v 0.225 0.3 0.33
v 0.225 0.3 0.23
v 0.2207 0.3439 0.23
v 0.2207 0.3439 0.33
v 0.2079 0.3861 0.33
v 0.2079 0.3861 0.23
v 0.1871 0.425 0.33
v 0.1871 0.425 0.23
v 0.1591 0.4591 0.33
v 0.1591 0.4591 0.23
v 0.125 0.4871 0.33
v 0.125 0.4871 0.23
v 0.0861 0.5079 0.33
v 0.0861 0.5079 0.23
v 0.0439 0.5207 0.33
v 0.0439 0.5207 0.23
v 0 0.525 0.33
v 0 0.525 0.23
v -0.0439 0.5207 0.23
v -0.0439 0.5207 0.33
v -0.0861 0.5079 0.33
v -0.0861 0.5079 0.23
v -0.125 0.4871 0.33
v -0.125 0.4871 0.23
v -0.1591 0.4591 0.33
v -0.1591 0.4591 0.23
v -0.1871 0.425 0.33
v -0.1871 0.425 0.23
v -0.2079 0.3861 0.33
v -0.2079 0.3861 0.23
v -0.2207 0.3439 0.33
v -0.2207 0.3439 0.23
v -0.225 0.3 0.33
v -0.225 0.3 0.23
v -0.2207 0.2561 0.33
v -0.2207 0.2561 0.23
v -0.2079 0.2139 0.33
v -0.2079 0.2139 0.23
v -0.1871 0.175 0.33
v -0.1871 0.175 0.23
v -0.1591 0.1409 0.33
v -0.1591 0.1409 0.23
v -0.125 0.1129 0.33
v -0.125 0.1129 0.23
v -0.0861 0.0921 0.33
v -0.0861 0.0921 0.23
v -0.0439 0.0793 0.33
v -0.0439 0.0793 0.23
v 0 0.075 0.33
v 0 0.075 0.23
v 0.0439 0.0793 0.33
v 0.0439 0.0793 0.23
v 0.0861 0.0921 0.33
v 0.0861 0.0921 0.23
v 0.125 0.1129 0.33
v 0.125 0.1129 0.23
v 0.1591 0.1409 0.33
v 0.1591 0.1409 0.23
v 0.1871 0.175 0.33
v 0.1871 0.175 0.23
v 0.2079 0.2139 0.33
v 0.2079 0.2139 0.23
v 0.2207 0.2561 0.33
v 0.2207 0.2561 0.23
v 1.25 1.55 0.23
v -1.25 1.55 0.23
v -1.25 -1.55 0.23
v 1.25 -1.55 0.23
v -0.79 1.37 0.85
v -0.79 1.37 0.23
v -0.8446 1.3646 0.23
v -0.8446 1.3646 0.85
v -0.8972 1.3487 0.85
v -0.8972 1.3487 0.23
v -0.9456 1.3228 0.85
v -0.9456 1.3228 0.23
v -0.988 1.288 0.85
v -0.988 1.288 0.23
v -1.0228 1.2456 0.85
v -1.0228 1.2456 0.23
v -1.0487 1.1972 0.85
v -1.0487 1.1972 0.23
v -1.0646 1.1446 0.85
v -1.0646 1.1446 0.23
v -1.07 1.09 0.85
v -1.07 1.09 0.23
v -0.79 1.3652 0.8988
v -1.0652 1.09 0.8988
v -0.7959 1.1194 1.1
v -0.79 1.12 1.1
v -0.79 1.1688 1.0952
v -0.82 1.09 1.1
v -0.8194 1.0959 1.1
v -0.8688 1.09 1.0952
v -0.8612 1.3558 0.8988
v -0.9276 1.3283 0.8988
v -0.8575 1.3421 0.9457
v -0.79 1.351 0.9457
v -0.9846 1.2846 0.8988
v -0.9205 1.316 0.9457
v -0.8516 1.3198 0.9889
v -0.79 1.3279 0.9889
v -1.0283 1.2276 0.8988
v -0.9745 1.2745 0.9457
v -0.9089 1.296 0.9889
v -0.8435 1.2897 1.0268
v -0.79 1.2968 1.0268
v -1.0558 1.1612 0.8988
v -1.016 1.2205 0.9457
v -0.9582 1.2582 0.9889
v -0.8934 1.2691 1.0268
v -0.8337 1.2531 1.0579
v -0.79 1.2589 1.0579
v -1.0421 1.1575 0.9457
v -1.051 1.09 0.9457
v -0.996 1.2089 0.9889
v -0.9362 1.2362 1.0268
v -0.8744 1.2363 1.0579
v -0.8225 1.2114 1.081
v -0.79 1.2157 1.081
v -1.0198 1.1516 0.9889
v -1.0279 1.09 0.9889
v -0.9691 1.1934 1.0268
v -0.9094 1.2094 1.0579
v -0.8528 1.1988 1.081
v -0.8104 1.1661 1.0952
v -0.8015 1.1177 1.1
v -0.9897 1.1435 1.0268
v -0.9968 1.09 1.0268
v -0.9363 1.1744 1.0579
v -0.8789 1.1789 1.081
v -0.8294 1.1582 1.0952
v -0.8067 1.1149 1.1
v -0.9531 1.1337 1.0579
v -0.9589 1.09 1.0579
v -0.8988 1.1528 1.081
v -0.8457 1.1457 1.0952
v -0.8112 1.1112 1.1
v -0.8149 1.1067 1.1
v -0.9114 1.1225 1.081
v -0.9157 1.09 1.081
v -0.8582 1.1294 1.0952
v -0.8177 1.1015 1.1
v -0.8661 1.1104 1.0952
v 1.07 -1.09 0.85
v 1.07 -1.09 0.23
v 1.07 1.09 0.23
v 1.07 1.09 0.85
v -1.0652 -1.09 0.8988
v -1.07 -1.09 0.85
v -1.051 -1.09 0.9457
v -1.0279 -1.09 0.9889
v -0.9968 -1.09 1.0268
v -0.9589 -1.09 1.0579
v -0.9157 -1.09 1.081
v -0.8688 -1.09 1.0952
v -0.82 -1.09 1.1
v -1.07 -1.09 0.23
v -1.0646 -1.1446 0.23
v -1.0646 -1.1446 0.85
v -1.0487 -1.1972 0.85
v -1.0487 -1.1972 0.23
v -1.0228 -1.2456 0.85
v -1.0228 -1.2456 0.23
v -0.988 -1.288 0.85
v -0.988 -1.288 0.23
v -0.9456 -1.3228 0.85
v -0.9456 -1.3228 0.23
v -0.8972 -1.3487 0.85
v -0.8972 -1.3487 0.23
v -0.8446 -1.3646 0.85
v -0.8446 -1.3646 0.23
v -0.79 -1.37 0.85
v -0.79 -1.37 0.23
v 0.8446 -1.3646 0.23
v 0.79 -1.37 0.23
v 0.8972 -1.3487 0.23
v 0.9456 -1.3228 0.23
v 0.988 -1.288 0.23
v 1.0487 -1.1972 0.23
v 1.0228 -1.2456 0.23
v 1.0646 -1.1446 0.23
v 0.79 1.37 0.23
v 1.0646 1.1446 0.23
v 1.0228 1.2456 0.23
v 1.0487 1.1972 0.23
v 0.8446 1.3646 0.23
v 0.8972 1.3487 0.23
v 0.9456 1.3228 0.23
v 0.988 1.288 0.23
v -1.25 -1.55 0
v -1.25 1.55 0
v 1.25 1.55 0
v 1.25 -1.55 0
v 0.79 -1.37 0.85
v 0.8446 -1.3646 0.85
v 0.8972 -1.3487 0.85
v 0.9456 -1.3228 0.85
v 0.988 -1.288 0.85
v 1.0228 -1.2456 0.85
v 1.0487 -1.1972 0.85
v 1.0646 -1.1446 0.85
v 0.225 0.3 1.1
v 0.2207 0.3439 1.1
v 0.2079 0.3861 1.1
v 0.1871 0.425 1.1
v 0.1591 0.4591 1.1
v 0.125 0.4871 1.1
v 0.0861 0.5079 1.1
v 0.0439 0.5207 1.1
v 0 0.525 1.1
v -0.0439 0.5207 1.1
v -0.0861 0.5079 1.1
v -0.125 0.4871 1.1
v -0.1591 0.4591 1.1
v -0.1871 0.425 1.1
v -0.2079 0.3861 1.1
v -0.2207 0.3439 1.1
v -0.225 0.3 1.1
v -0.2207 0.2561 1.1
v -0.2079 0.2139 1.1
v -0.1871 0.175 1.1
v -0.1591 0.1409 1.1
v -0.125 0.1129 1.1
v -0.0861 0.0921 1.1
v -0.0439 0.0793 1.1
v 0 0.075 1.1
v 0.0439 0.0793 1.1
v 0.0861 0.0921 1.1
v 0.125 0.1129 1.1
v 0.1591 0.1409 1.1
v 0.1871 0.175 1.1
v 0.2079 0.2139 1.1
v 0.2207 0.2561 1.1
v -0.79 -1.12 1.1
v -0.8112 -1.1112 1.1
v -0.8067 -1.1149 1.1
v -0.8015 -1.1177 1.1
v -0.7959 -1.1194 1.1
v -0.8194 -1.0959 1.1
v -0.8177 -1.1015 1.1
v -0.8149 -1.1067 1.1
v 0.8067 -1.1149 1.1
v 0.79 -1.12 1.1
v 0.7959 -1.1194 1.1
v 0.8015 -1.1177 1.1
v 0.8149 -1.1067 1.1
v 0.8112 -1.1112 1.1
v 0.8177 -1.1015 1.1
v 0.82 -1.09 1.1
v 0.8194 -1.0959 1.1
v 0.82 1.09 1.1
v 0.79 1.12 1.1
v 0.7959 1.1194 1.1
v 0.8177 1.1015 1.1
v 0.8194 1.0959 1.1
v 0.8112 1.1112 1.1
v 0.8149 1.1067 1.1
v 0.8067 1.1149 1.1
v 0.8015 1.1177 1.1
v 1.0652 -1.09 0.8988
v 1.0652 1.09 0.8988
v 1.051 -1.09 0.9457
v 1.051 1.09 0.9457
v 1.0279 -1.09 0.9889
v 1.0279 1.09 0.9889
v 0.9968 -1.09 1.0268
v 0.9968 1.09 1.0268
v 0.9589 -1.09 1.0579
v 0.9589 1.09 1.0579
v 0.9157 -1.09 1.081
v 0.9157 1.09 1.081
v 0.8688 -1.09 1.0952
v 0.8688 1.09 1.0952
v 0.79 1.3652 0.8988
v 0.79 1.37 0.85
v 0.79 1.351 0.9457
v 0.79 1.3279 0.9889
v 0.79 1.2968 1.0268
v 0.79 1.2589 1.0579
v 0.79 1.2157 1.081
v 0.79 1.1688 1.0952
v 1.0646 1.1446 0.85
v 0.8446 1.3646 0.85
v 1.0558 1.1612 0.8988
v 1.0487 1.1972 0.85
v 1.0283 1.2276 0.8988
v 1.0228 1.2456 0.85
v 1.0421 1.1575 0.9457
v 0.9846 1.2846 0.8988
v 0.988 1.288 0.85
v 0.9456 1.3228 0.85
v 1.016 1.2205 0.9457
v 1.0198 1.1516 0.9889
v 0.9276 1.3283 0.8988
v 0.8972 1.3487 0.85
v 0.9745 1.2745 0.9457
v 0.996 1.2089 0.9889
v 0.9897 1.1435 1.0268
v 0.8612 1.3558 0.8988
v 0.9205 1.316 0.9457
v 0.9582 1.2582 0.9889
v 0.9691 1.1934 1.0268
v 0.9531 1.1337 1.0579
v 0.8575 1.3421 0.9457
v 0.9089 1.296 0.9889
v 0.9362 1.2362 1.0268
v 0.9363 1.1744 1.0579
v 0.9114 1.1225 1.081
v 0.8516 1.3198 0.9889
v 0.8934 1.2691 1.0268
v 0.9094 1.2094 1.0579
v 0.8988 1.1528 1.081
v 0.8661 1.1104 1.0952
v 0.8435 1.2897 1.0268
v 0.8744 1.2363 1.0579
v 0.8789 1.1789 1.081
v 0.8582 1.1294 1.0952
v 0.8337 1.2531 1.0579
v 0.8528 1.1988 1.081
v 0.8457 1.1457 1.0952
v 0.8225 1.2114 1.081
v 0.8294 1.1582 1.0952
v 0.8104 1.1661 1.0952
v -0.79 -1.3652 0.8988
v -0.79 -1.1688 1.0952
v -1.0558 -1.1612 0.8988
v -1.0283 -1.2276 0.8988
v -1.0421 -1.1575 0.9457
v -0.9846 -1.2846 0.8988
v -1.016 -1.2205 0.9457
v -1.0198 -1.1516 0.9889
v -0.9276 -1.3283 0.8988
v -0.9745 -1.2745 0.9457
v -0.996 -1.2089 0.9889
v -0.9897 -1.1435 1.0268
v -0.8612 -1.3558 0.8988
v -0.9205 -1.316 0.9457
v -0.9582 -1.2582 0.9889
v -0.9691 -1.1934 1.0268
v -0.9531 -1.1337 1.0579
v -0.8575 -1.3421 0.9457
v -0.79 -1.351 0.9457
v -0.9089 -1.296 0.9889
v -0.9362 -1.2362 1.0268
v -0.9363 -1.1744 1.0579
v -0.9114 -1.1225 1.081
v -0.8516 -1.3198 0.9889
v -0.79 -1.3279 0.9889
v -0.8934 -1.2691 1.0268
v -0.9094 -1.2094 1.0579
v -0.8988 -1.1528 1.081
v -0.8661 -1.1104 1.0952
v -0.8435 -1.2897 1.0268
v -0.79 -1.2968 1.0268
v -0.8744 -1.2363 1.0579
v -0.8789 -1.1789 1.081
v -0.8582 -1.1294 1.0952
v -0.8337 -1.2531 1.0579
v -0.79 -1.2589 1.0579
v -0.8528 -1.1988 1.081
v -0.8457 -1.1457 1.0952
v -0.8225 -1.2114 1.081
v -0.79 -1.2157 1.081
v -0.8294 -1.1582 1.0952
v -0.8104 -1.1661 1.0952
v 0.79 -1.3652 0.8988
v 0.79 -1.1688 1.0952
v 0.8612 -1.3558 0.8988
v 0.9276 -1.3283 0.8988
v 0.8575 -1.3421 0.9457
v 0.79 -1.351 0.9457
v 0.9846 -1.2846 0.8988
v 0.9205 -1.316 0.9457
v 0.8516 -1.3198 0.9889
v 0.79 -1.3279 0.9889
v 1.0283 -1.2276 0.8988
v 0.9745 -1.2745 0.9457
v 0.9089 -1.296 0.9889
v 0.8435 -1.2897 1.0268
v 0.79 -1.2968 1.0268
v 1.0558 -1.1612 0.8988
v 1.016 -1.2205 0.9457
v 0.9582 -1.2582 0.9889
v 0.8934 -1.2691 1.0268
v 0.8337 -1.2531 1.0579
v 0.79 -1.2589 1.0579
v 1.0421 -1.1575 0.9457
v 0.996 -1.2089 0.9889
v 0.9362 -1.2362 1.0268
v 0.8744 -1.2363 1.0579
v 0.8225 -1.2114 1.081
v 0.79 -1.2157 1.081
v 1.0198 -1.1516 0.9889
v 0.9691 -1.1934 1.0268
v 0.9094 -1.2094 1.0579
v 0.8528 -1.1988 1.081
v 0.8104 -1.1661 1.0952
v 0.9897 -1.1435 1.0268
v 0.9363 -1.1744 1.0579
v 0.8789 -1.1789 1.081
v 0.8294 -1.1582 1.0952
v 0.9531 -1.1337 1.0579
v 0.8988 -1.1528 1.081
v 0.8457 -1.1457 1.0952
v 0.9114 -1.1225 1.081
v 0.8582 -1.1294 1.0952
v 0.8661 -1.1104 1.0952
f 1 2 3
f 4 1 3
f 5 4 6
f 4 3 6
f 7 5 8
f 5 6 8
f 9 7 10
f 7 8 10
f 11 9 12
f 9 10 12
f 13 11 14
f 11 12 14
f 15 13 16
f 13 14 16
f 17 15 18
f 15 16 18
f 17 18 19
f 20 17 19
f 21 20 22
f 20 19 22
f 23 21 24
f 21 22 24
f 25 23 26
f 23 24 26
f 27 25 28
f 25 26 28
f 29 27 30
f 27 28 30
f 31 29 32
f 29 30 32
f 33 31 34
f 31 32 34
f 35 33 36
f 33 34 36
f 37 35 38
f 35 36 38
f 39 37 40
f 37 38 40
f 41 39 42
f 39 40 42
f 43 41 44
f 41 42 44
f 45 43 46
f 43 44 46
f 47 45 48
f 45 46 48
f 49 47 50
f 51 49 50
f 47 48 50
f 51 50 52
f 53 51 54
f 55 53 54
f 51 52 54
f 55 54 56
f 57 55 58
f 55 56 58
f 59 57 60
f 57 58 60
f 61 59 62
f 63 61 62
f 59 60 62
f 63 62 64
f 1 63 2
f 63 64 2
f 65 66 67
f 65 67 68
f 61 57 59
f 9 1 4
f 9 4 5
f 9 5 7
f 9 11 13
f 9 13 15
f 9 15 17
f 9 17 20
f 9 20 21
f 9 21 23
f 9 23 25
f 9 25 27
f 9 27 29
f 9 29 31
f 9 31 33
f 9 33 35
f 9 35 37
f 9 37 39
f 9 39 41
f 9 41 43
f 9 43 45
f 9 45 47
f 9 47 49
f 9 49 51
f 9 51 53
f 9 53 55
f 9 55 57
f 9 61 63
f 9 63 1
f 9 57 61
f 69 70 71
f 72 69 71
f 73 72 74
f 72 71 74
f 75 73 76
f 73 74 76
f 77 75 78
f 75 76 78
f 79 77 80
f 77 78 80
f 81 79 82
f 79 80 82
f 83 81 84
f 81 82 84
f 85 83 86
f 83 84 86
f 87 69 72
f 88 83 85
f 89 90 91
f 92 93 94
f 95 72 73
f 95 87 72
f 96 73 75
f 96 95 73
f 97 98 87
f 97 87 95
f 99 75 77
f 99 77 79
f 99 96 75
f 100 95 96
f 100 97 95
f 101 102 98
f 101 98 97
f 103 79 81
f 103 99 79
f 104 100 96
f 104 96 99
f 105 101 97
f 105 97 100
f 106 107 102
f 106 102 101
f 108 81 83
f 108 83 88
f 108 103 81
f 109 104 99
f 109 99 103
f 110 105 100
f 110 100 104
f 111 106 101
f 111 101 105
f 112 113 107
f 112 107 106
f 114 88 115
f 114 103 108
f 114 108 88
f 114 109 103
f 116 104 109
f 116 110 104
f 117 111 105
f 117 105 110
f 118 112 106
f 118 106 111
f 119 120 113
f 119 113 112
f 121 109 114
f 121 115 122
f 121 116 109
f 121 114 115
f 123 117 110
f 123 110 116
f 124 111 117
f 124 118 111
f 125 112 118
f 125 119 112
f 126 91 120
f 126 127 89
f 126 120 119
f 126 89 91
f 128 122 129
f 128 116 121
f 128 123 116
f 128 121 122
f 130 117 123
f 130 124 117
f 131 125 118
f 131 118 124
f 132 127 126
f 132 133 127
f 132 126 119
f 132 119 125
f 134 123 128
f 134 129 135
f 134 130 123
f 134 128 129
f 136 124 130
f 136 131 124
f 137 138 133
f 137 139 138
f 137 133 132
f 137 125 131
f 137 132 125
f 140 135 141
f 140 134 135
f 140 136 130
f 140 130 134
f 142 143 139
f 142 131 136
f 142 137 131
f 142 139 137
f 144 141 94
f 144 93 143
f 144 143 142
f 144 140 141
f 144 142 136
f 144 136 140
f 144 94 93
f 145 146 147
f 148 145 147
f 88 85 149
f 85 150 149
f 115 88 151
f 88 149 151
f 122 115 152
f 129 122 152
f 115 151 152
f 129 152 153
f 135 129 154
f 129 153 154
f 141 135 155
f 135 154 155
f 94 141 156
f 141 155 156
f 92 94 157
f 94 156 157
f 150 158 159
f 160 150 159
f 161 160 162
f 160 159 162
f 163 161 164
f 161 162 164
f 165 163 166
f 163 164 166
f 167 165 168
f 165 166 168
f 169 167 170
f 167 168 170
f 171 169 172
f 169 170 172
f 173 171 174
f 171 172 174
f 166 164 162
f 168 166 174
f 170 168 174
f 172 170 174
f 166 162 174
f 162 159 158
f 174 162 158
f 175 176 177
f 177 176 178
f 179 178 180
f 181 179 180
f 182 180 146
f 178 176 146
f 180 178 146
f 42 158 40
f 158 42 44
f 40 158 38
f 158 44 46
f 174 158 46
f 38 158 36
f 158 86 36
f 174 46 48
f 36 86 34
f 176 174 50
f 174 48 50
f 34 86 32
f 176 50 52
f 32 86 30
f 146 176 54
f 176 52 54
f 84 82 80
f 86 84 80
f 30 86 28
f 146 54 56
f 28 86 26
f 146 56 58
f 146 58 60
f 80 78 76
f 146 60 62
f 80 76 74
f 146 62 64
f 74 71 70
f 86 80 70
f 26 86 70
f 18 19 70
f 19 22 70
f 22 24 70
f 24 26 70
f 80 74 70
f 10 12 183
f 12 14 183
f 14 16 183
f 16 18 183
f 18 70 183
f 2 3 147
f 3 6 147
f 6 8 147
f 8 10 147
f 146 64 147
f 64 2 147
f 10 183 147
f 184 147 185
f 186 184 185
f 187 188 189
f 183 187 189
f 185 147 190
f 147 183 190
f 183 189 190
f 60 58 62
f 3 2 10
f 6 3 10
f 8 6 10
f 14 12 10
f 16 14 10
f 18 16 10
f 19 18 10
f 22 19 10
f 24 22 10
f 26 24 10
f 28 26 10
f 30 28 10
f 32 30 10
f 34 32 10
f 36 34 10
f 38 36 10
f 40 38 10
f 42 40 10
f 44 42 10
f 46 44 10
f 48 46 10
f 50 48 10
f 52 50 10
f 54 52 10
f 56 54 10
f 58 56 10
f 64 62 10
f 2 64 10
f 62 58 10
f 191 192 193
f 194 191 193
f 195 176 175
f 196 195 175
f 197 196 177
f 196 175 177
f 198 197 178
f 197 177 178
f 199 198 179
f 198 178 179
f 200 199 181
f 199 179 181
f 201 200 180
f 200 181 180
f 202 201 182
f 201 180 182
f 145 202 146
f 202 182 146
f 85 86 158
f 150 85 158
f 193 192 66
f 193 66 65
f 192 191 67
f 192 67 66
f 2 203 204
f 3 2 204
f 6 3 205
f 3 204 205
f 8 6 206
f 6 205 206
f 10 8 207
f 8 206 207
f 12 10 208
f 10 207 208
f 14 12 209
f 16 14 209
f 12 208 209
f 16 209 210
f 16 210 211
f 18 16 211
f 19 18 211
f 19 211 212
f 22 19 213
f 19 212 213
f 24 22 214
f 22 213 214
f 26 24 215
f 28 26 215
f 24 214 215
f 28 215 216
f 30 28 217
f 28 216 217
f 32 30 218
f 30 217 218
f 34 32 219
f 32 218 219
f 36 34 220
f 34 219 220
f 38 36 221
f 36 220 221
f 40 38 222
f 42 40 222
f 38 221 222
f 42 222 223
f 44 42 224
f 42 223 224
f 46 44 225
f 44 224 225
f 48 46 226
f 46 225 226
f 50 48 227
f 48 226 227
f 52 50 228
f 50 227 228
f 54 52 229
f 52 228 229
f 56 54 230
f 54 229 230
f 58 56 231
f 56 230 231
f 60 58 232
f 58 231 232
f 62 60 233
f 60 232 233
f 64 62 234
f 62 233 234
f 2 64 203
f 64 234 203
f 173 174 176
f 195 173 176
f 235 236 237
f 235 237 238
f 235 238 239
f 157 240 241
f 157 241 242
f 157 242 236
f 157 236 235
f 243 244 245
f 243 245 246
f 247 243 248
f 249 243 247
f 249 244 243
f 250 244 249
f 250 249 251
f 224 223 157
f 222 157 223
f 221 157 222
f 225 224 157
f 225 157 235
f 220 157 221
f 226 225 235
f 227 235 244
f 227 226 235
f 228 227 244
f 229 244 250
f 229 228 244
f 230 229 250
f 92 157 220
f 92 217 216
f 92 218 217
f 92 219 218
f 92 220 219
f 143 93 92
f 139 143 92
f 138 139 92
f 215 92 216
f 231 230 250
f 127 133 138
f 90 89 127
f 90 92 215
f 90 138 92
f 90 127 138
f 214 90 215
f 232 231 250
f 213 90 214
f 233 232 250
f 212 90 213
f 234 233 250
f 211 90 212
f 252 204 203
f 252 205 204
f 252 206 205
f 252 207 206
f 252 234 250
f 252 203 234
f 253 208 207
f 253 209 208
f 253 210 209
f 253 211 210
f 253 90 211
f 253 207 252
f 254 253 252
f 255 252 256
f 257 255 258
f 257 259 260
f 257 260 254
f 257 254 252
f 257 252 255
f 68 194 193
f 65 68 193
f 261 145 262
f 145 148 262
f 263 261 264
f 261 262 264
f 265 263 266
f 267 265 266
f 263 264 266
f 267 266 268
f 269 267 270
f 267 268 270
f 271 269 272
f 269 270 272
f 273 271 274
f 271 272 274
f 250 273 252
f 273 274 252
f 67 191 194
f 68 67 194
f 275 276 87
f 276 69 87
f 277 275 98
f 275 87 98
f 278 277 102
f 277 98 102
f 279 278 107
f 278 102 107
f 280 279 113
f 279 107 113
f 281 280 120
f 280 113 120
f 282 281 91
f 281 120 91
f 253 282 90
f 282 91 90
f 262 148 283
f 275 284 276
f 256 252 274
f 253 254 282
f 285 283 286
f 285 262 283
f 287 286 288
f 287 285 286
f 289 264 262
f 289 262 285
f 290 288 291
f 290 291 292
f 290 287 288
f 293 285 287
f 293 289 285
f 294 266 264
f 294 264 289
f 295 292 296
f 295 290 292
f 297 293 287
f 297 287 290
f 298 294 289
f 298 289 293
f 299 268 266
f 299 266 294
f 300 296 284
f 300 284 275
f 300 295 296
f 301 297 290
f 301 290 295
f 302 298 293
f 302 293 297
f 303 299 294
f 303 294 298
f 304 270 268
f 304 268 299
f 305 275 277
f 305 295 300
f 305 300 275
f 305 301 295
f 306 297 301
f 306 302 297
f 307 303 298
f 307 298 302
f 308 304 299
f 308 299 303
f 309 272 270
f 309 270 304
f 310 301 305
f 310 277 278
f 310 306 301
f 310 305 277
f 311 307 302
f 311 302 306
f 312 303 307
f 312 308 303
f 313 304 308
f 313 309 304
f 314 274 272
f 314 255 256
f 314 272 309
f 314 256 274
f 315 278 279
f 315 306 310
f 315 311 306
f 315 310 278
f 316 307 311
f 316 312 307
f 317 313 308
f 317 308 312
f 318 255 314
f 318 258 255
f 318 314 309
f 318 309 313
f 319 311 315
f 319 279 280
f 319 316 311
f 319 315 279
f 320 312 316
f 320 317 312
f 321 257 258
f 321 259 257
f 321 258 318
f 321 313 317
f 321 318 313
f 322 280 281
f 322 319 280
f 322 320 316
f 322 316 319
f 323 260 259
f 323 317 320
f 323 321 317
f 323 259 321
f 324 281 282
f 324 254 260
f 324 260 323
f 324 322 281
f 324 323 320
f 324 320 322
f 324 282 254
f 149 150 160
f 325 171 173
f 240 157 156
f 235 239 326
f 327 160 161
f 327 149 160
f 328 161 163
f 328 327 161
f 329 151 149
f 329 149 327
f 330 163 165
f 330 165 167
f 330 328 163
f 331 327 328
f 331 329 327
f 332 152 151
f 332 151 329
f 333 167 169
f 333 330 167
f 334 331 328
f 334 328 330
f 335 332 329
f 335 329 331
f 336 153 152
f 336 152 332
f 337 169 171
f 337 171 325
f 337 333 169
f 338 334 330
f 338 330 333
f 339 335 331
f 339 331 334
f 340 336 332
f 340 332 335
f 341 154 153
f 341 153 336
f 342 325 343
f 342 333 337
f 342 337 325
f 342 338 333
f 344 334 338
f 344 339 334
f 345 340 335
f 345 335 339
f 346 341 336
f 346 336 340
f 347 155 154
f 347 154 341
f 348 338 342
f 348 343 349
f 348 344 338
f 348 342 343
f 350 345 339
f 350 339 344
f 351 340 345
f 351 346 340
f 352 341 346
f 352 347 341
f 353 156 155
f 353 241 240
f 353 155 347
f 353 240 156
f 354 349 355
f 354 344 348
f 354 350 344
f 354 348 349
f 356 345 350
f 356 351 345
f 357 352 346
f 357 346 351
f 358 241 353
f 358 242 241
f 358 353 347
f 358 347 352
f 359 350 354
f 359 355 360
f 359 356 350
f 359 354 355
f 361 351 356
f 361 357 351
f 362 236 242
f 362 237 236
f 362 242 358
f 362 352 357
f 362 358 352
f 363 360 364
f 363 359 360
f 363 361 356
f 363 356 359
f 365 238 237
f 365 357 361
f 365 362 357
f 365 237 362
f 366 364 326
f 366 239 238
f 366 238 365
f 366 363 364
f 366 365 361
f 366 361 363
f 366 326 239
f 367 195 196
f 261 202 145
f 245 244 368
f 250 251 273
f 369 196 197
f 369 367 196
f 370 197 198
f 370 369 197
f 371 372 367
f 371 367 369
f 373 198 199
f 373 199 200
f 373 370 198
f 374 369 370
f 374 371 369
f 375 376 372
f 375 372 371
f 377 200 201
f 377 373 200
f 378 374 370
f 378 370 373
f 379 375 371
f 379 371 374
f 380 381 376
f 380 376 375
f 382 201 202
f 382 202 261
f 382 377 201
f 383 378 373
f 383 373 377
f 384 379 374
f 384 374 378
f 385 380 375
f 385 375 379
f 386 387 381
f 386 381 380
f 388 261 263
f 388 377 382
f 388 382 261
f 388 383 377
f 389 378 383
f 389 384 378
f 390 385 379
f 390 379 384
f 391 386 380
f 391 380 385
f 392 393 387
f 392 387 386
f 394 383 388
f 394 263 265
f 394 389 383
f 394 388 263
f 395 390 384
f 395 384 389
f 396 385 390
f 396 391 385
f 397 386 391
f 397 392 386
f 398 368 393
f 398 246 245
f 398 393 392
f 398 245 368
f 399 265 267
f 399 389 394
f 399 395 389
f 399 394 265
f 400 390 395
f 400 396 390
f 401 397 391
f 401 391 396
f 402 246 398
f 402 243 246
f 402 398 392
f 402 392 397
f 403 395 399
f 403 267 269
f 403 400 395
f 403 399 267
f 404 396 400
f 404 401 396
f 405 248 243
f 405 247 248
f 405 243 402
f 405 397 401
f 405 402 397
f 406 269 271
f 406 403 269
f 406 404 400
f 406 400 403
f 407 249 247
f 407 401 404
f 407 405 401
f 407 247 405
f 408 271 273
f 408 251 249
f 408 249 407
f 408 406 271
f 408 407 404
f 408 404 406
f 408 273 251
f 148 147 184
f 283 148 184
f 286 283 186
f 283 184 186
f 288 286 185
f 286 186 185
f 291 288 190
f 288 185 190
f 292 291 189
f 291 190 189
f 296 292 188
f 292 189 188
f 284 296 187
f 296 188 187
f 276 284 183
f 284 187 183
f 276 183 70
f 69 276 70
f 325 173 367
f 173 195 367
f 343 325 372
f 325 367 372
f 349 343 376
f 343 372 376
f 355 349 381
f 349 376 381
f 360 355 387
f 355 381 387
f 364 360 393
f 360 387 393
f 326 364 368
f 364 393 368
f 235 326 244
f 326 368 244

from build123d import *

# Parameters (mm, degrees)
F0_W     = 2.5
F0_H     = 3.1
F1_DEPTH = 0.23
F3_DEPTH = 0.87
F4_R     = 0.25
F5_R     = 0.225
F6_DEPTH = 0.87
F7_R     = 0.225
F8_DEPTH = 0.1


with BuildPart() as f1:
    # F0 (on Top) → F1 (new body)
    with BuildSketch(Plane.XY):
        Rectangle(F0_W, F0_H)
    extrude(amount=F1_DEPTH)


with BuildPart() as f3:
    # F2 (on face) → F3 (new body)
    with BuildSketch(Plane.XY.offset(0.23)):
        with BuildLine():
            Line((-0.79, -1.37), (0.79, -1.37))
            ThreePointArc((0.79, -1.37), (0.9879898987, -1.2879898987), (1.07, -1.09))
            Line((1.07, -1.09), (1.07, 1.09))
            ThreePointArc((1.07, 1.09), (0.9879898987, 1.2879898987), (0.79, 1.37))
            Line((0.79, 1.37), (-0.79, 1.37))
            ThreePointArc((-0.79, 1.37), (-0.9879898987, 1.2879898987), (-1.07, 1.09))
            Line((-1.07, 1.09), (-1.07, -1.09))
            ThreePointArc((-1.07, -1.09), (-0.9879898987, -1.2879898987), (-0.79, -1.37))
        make_face()
    extrude(amount=F3_DEPTH)

    # F4
    f4_edges = [f3.edges().sort_by_distance(p)[0] for p in [
        (0, -1.37, 1.1),
    ]]
    fillet(f4_edges, radius=F4_R)

    # F5 (on face) → F6 (cut, through all)
    with BuildSketch(Plane.XY.offset(1.1)):
        with Locations((0, 0.3)):
            Circle(F5_R)
    extrude(amount=-F6_DEPTH, mode=Mode.SUBTRACT)


with BuildPart() as f8:
    # F7 (on face) → F8 (new body)
    with BuildSketch(Plane.XY.offset(0.23)):
        with Locations((0, 0.3)):
            Circle(F7_R)
    extrude(amount=F8_DEPTH)


solid = Compound([f1.part, f3.part, f8.part])
